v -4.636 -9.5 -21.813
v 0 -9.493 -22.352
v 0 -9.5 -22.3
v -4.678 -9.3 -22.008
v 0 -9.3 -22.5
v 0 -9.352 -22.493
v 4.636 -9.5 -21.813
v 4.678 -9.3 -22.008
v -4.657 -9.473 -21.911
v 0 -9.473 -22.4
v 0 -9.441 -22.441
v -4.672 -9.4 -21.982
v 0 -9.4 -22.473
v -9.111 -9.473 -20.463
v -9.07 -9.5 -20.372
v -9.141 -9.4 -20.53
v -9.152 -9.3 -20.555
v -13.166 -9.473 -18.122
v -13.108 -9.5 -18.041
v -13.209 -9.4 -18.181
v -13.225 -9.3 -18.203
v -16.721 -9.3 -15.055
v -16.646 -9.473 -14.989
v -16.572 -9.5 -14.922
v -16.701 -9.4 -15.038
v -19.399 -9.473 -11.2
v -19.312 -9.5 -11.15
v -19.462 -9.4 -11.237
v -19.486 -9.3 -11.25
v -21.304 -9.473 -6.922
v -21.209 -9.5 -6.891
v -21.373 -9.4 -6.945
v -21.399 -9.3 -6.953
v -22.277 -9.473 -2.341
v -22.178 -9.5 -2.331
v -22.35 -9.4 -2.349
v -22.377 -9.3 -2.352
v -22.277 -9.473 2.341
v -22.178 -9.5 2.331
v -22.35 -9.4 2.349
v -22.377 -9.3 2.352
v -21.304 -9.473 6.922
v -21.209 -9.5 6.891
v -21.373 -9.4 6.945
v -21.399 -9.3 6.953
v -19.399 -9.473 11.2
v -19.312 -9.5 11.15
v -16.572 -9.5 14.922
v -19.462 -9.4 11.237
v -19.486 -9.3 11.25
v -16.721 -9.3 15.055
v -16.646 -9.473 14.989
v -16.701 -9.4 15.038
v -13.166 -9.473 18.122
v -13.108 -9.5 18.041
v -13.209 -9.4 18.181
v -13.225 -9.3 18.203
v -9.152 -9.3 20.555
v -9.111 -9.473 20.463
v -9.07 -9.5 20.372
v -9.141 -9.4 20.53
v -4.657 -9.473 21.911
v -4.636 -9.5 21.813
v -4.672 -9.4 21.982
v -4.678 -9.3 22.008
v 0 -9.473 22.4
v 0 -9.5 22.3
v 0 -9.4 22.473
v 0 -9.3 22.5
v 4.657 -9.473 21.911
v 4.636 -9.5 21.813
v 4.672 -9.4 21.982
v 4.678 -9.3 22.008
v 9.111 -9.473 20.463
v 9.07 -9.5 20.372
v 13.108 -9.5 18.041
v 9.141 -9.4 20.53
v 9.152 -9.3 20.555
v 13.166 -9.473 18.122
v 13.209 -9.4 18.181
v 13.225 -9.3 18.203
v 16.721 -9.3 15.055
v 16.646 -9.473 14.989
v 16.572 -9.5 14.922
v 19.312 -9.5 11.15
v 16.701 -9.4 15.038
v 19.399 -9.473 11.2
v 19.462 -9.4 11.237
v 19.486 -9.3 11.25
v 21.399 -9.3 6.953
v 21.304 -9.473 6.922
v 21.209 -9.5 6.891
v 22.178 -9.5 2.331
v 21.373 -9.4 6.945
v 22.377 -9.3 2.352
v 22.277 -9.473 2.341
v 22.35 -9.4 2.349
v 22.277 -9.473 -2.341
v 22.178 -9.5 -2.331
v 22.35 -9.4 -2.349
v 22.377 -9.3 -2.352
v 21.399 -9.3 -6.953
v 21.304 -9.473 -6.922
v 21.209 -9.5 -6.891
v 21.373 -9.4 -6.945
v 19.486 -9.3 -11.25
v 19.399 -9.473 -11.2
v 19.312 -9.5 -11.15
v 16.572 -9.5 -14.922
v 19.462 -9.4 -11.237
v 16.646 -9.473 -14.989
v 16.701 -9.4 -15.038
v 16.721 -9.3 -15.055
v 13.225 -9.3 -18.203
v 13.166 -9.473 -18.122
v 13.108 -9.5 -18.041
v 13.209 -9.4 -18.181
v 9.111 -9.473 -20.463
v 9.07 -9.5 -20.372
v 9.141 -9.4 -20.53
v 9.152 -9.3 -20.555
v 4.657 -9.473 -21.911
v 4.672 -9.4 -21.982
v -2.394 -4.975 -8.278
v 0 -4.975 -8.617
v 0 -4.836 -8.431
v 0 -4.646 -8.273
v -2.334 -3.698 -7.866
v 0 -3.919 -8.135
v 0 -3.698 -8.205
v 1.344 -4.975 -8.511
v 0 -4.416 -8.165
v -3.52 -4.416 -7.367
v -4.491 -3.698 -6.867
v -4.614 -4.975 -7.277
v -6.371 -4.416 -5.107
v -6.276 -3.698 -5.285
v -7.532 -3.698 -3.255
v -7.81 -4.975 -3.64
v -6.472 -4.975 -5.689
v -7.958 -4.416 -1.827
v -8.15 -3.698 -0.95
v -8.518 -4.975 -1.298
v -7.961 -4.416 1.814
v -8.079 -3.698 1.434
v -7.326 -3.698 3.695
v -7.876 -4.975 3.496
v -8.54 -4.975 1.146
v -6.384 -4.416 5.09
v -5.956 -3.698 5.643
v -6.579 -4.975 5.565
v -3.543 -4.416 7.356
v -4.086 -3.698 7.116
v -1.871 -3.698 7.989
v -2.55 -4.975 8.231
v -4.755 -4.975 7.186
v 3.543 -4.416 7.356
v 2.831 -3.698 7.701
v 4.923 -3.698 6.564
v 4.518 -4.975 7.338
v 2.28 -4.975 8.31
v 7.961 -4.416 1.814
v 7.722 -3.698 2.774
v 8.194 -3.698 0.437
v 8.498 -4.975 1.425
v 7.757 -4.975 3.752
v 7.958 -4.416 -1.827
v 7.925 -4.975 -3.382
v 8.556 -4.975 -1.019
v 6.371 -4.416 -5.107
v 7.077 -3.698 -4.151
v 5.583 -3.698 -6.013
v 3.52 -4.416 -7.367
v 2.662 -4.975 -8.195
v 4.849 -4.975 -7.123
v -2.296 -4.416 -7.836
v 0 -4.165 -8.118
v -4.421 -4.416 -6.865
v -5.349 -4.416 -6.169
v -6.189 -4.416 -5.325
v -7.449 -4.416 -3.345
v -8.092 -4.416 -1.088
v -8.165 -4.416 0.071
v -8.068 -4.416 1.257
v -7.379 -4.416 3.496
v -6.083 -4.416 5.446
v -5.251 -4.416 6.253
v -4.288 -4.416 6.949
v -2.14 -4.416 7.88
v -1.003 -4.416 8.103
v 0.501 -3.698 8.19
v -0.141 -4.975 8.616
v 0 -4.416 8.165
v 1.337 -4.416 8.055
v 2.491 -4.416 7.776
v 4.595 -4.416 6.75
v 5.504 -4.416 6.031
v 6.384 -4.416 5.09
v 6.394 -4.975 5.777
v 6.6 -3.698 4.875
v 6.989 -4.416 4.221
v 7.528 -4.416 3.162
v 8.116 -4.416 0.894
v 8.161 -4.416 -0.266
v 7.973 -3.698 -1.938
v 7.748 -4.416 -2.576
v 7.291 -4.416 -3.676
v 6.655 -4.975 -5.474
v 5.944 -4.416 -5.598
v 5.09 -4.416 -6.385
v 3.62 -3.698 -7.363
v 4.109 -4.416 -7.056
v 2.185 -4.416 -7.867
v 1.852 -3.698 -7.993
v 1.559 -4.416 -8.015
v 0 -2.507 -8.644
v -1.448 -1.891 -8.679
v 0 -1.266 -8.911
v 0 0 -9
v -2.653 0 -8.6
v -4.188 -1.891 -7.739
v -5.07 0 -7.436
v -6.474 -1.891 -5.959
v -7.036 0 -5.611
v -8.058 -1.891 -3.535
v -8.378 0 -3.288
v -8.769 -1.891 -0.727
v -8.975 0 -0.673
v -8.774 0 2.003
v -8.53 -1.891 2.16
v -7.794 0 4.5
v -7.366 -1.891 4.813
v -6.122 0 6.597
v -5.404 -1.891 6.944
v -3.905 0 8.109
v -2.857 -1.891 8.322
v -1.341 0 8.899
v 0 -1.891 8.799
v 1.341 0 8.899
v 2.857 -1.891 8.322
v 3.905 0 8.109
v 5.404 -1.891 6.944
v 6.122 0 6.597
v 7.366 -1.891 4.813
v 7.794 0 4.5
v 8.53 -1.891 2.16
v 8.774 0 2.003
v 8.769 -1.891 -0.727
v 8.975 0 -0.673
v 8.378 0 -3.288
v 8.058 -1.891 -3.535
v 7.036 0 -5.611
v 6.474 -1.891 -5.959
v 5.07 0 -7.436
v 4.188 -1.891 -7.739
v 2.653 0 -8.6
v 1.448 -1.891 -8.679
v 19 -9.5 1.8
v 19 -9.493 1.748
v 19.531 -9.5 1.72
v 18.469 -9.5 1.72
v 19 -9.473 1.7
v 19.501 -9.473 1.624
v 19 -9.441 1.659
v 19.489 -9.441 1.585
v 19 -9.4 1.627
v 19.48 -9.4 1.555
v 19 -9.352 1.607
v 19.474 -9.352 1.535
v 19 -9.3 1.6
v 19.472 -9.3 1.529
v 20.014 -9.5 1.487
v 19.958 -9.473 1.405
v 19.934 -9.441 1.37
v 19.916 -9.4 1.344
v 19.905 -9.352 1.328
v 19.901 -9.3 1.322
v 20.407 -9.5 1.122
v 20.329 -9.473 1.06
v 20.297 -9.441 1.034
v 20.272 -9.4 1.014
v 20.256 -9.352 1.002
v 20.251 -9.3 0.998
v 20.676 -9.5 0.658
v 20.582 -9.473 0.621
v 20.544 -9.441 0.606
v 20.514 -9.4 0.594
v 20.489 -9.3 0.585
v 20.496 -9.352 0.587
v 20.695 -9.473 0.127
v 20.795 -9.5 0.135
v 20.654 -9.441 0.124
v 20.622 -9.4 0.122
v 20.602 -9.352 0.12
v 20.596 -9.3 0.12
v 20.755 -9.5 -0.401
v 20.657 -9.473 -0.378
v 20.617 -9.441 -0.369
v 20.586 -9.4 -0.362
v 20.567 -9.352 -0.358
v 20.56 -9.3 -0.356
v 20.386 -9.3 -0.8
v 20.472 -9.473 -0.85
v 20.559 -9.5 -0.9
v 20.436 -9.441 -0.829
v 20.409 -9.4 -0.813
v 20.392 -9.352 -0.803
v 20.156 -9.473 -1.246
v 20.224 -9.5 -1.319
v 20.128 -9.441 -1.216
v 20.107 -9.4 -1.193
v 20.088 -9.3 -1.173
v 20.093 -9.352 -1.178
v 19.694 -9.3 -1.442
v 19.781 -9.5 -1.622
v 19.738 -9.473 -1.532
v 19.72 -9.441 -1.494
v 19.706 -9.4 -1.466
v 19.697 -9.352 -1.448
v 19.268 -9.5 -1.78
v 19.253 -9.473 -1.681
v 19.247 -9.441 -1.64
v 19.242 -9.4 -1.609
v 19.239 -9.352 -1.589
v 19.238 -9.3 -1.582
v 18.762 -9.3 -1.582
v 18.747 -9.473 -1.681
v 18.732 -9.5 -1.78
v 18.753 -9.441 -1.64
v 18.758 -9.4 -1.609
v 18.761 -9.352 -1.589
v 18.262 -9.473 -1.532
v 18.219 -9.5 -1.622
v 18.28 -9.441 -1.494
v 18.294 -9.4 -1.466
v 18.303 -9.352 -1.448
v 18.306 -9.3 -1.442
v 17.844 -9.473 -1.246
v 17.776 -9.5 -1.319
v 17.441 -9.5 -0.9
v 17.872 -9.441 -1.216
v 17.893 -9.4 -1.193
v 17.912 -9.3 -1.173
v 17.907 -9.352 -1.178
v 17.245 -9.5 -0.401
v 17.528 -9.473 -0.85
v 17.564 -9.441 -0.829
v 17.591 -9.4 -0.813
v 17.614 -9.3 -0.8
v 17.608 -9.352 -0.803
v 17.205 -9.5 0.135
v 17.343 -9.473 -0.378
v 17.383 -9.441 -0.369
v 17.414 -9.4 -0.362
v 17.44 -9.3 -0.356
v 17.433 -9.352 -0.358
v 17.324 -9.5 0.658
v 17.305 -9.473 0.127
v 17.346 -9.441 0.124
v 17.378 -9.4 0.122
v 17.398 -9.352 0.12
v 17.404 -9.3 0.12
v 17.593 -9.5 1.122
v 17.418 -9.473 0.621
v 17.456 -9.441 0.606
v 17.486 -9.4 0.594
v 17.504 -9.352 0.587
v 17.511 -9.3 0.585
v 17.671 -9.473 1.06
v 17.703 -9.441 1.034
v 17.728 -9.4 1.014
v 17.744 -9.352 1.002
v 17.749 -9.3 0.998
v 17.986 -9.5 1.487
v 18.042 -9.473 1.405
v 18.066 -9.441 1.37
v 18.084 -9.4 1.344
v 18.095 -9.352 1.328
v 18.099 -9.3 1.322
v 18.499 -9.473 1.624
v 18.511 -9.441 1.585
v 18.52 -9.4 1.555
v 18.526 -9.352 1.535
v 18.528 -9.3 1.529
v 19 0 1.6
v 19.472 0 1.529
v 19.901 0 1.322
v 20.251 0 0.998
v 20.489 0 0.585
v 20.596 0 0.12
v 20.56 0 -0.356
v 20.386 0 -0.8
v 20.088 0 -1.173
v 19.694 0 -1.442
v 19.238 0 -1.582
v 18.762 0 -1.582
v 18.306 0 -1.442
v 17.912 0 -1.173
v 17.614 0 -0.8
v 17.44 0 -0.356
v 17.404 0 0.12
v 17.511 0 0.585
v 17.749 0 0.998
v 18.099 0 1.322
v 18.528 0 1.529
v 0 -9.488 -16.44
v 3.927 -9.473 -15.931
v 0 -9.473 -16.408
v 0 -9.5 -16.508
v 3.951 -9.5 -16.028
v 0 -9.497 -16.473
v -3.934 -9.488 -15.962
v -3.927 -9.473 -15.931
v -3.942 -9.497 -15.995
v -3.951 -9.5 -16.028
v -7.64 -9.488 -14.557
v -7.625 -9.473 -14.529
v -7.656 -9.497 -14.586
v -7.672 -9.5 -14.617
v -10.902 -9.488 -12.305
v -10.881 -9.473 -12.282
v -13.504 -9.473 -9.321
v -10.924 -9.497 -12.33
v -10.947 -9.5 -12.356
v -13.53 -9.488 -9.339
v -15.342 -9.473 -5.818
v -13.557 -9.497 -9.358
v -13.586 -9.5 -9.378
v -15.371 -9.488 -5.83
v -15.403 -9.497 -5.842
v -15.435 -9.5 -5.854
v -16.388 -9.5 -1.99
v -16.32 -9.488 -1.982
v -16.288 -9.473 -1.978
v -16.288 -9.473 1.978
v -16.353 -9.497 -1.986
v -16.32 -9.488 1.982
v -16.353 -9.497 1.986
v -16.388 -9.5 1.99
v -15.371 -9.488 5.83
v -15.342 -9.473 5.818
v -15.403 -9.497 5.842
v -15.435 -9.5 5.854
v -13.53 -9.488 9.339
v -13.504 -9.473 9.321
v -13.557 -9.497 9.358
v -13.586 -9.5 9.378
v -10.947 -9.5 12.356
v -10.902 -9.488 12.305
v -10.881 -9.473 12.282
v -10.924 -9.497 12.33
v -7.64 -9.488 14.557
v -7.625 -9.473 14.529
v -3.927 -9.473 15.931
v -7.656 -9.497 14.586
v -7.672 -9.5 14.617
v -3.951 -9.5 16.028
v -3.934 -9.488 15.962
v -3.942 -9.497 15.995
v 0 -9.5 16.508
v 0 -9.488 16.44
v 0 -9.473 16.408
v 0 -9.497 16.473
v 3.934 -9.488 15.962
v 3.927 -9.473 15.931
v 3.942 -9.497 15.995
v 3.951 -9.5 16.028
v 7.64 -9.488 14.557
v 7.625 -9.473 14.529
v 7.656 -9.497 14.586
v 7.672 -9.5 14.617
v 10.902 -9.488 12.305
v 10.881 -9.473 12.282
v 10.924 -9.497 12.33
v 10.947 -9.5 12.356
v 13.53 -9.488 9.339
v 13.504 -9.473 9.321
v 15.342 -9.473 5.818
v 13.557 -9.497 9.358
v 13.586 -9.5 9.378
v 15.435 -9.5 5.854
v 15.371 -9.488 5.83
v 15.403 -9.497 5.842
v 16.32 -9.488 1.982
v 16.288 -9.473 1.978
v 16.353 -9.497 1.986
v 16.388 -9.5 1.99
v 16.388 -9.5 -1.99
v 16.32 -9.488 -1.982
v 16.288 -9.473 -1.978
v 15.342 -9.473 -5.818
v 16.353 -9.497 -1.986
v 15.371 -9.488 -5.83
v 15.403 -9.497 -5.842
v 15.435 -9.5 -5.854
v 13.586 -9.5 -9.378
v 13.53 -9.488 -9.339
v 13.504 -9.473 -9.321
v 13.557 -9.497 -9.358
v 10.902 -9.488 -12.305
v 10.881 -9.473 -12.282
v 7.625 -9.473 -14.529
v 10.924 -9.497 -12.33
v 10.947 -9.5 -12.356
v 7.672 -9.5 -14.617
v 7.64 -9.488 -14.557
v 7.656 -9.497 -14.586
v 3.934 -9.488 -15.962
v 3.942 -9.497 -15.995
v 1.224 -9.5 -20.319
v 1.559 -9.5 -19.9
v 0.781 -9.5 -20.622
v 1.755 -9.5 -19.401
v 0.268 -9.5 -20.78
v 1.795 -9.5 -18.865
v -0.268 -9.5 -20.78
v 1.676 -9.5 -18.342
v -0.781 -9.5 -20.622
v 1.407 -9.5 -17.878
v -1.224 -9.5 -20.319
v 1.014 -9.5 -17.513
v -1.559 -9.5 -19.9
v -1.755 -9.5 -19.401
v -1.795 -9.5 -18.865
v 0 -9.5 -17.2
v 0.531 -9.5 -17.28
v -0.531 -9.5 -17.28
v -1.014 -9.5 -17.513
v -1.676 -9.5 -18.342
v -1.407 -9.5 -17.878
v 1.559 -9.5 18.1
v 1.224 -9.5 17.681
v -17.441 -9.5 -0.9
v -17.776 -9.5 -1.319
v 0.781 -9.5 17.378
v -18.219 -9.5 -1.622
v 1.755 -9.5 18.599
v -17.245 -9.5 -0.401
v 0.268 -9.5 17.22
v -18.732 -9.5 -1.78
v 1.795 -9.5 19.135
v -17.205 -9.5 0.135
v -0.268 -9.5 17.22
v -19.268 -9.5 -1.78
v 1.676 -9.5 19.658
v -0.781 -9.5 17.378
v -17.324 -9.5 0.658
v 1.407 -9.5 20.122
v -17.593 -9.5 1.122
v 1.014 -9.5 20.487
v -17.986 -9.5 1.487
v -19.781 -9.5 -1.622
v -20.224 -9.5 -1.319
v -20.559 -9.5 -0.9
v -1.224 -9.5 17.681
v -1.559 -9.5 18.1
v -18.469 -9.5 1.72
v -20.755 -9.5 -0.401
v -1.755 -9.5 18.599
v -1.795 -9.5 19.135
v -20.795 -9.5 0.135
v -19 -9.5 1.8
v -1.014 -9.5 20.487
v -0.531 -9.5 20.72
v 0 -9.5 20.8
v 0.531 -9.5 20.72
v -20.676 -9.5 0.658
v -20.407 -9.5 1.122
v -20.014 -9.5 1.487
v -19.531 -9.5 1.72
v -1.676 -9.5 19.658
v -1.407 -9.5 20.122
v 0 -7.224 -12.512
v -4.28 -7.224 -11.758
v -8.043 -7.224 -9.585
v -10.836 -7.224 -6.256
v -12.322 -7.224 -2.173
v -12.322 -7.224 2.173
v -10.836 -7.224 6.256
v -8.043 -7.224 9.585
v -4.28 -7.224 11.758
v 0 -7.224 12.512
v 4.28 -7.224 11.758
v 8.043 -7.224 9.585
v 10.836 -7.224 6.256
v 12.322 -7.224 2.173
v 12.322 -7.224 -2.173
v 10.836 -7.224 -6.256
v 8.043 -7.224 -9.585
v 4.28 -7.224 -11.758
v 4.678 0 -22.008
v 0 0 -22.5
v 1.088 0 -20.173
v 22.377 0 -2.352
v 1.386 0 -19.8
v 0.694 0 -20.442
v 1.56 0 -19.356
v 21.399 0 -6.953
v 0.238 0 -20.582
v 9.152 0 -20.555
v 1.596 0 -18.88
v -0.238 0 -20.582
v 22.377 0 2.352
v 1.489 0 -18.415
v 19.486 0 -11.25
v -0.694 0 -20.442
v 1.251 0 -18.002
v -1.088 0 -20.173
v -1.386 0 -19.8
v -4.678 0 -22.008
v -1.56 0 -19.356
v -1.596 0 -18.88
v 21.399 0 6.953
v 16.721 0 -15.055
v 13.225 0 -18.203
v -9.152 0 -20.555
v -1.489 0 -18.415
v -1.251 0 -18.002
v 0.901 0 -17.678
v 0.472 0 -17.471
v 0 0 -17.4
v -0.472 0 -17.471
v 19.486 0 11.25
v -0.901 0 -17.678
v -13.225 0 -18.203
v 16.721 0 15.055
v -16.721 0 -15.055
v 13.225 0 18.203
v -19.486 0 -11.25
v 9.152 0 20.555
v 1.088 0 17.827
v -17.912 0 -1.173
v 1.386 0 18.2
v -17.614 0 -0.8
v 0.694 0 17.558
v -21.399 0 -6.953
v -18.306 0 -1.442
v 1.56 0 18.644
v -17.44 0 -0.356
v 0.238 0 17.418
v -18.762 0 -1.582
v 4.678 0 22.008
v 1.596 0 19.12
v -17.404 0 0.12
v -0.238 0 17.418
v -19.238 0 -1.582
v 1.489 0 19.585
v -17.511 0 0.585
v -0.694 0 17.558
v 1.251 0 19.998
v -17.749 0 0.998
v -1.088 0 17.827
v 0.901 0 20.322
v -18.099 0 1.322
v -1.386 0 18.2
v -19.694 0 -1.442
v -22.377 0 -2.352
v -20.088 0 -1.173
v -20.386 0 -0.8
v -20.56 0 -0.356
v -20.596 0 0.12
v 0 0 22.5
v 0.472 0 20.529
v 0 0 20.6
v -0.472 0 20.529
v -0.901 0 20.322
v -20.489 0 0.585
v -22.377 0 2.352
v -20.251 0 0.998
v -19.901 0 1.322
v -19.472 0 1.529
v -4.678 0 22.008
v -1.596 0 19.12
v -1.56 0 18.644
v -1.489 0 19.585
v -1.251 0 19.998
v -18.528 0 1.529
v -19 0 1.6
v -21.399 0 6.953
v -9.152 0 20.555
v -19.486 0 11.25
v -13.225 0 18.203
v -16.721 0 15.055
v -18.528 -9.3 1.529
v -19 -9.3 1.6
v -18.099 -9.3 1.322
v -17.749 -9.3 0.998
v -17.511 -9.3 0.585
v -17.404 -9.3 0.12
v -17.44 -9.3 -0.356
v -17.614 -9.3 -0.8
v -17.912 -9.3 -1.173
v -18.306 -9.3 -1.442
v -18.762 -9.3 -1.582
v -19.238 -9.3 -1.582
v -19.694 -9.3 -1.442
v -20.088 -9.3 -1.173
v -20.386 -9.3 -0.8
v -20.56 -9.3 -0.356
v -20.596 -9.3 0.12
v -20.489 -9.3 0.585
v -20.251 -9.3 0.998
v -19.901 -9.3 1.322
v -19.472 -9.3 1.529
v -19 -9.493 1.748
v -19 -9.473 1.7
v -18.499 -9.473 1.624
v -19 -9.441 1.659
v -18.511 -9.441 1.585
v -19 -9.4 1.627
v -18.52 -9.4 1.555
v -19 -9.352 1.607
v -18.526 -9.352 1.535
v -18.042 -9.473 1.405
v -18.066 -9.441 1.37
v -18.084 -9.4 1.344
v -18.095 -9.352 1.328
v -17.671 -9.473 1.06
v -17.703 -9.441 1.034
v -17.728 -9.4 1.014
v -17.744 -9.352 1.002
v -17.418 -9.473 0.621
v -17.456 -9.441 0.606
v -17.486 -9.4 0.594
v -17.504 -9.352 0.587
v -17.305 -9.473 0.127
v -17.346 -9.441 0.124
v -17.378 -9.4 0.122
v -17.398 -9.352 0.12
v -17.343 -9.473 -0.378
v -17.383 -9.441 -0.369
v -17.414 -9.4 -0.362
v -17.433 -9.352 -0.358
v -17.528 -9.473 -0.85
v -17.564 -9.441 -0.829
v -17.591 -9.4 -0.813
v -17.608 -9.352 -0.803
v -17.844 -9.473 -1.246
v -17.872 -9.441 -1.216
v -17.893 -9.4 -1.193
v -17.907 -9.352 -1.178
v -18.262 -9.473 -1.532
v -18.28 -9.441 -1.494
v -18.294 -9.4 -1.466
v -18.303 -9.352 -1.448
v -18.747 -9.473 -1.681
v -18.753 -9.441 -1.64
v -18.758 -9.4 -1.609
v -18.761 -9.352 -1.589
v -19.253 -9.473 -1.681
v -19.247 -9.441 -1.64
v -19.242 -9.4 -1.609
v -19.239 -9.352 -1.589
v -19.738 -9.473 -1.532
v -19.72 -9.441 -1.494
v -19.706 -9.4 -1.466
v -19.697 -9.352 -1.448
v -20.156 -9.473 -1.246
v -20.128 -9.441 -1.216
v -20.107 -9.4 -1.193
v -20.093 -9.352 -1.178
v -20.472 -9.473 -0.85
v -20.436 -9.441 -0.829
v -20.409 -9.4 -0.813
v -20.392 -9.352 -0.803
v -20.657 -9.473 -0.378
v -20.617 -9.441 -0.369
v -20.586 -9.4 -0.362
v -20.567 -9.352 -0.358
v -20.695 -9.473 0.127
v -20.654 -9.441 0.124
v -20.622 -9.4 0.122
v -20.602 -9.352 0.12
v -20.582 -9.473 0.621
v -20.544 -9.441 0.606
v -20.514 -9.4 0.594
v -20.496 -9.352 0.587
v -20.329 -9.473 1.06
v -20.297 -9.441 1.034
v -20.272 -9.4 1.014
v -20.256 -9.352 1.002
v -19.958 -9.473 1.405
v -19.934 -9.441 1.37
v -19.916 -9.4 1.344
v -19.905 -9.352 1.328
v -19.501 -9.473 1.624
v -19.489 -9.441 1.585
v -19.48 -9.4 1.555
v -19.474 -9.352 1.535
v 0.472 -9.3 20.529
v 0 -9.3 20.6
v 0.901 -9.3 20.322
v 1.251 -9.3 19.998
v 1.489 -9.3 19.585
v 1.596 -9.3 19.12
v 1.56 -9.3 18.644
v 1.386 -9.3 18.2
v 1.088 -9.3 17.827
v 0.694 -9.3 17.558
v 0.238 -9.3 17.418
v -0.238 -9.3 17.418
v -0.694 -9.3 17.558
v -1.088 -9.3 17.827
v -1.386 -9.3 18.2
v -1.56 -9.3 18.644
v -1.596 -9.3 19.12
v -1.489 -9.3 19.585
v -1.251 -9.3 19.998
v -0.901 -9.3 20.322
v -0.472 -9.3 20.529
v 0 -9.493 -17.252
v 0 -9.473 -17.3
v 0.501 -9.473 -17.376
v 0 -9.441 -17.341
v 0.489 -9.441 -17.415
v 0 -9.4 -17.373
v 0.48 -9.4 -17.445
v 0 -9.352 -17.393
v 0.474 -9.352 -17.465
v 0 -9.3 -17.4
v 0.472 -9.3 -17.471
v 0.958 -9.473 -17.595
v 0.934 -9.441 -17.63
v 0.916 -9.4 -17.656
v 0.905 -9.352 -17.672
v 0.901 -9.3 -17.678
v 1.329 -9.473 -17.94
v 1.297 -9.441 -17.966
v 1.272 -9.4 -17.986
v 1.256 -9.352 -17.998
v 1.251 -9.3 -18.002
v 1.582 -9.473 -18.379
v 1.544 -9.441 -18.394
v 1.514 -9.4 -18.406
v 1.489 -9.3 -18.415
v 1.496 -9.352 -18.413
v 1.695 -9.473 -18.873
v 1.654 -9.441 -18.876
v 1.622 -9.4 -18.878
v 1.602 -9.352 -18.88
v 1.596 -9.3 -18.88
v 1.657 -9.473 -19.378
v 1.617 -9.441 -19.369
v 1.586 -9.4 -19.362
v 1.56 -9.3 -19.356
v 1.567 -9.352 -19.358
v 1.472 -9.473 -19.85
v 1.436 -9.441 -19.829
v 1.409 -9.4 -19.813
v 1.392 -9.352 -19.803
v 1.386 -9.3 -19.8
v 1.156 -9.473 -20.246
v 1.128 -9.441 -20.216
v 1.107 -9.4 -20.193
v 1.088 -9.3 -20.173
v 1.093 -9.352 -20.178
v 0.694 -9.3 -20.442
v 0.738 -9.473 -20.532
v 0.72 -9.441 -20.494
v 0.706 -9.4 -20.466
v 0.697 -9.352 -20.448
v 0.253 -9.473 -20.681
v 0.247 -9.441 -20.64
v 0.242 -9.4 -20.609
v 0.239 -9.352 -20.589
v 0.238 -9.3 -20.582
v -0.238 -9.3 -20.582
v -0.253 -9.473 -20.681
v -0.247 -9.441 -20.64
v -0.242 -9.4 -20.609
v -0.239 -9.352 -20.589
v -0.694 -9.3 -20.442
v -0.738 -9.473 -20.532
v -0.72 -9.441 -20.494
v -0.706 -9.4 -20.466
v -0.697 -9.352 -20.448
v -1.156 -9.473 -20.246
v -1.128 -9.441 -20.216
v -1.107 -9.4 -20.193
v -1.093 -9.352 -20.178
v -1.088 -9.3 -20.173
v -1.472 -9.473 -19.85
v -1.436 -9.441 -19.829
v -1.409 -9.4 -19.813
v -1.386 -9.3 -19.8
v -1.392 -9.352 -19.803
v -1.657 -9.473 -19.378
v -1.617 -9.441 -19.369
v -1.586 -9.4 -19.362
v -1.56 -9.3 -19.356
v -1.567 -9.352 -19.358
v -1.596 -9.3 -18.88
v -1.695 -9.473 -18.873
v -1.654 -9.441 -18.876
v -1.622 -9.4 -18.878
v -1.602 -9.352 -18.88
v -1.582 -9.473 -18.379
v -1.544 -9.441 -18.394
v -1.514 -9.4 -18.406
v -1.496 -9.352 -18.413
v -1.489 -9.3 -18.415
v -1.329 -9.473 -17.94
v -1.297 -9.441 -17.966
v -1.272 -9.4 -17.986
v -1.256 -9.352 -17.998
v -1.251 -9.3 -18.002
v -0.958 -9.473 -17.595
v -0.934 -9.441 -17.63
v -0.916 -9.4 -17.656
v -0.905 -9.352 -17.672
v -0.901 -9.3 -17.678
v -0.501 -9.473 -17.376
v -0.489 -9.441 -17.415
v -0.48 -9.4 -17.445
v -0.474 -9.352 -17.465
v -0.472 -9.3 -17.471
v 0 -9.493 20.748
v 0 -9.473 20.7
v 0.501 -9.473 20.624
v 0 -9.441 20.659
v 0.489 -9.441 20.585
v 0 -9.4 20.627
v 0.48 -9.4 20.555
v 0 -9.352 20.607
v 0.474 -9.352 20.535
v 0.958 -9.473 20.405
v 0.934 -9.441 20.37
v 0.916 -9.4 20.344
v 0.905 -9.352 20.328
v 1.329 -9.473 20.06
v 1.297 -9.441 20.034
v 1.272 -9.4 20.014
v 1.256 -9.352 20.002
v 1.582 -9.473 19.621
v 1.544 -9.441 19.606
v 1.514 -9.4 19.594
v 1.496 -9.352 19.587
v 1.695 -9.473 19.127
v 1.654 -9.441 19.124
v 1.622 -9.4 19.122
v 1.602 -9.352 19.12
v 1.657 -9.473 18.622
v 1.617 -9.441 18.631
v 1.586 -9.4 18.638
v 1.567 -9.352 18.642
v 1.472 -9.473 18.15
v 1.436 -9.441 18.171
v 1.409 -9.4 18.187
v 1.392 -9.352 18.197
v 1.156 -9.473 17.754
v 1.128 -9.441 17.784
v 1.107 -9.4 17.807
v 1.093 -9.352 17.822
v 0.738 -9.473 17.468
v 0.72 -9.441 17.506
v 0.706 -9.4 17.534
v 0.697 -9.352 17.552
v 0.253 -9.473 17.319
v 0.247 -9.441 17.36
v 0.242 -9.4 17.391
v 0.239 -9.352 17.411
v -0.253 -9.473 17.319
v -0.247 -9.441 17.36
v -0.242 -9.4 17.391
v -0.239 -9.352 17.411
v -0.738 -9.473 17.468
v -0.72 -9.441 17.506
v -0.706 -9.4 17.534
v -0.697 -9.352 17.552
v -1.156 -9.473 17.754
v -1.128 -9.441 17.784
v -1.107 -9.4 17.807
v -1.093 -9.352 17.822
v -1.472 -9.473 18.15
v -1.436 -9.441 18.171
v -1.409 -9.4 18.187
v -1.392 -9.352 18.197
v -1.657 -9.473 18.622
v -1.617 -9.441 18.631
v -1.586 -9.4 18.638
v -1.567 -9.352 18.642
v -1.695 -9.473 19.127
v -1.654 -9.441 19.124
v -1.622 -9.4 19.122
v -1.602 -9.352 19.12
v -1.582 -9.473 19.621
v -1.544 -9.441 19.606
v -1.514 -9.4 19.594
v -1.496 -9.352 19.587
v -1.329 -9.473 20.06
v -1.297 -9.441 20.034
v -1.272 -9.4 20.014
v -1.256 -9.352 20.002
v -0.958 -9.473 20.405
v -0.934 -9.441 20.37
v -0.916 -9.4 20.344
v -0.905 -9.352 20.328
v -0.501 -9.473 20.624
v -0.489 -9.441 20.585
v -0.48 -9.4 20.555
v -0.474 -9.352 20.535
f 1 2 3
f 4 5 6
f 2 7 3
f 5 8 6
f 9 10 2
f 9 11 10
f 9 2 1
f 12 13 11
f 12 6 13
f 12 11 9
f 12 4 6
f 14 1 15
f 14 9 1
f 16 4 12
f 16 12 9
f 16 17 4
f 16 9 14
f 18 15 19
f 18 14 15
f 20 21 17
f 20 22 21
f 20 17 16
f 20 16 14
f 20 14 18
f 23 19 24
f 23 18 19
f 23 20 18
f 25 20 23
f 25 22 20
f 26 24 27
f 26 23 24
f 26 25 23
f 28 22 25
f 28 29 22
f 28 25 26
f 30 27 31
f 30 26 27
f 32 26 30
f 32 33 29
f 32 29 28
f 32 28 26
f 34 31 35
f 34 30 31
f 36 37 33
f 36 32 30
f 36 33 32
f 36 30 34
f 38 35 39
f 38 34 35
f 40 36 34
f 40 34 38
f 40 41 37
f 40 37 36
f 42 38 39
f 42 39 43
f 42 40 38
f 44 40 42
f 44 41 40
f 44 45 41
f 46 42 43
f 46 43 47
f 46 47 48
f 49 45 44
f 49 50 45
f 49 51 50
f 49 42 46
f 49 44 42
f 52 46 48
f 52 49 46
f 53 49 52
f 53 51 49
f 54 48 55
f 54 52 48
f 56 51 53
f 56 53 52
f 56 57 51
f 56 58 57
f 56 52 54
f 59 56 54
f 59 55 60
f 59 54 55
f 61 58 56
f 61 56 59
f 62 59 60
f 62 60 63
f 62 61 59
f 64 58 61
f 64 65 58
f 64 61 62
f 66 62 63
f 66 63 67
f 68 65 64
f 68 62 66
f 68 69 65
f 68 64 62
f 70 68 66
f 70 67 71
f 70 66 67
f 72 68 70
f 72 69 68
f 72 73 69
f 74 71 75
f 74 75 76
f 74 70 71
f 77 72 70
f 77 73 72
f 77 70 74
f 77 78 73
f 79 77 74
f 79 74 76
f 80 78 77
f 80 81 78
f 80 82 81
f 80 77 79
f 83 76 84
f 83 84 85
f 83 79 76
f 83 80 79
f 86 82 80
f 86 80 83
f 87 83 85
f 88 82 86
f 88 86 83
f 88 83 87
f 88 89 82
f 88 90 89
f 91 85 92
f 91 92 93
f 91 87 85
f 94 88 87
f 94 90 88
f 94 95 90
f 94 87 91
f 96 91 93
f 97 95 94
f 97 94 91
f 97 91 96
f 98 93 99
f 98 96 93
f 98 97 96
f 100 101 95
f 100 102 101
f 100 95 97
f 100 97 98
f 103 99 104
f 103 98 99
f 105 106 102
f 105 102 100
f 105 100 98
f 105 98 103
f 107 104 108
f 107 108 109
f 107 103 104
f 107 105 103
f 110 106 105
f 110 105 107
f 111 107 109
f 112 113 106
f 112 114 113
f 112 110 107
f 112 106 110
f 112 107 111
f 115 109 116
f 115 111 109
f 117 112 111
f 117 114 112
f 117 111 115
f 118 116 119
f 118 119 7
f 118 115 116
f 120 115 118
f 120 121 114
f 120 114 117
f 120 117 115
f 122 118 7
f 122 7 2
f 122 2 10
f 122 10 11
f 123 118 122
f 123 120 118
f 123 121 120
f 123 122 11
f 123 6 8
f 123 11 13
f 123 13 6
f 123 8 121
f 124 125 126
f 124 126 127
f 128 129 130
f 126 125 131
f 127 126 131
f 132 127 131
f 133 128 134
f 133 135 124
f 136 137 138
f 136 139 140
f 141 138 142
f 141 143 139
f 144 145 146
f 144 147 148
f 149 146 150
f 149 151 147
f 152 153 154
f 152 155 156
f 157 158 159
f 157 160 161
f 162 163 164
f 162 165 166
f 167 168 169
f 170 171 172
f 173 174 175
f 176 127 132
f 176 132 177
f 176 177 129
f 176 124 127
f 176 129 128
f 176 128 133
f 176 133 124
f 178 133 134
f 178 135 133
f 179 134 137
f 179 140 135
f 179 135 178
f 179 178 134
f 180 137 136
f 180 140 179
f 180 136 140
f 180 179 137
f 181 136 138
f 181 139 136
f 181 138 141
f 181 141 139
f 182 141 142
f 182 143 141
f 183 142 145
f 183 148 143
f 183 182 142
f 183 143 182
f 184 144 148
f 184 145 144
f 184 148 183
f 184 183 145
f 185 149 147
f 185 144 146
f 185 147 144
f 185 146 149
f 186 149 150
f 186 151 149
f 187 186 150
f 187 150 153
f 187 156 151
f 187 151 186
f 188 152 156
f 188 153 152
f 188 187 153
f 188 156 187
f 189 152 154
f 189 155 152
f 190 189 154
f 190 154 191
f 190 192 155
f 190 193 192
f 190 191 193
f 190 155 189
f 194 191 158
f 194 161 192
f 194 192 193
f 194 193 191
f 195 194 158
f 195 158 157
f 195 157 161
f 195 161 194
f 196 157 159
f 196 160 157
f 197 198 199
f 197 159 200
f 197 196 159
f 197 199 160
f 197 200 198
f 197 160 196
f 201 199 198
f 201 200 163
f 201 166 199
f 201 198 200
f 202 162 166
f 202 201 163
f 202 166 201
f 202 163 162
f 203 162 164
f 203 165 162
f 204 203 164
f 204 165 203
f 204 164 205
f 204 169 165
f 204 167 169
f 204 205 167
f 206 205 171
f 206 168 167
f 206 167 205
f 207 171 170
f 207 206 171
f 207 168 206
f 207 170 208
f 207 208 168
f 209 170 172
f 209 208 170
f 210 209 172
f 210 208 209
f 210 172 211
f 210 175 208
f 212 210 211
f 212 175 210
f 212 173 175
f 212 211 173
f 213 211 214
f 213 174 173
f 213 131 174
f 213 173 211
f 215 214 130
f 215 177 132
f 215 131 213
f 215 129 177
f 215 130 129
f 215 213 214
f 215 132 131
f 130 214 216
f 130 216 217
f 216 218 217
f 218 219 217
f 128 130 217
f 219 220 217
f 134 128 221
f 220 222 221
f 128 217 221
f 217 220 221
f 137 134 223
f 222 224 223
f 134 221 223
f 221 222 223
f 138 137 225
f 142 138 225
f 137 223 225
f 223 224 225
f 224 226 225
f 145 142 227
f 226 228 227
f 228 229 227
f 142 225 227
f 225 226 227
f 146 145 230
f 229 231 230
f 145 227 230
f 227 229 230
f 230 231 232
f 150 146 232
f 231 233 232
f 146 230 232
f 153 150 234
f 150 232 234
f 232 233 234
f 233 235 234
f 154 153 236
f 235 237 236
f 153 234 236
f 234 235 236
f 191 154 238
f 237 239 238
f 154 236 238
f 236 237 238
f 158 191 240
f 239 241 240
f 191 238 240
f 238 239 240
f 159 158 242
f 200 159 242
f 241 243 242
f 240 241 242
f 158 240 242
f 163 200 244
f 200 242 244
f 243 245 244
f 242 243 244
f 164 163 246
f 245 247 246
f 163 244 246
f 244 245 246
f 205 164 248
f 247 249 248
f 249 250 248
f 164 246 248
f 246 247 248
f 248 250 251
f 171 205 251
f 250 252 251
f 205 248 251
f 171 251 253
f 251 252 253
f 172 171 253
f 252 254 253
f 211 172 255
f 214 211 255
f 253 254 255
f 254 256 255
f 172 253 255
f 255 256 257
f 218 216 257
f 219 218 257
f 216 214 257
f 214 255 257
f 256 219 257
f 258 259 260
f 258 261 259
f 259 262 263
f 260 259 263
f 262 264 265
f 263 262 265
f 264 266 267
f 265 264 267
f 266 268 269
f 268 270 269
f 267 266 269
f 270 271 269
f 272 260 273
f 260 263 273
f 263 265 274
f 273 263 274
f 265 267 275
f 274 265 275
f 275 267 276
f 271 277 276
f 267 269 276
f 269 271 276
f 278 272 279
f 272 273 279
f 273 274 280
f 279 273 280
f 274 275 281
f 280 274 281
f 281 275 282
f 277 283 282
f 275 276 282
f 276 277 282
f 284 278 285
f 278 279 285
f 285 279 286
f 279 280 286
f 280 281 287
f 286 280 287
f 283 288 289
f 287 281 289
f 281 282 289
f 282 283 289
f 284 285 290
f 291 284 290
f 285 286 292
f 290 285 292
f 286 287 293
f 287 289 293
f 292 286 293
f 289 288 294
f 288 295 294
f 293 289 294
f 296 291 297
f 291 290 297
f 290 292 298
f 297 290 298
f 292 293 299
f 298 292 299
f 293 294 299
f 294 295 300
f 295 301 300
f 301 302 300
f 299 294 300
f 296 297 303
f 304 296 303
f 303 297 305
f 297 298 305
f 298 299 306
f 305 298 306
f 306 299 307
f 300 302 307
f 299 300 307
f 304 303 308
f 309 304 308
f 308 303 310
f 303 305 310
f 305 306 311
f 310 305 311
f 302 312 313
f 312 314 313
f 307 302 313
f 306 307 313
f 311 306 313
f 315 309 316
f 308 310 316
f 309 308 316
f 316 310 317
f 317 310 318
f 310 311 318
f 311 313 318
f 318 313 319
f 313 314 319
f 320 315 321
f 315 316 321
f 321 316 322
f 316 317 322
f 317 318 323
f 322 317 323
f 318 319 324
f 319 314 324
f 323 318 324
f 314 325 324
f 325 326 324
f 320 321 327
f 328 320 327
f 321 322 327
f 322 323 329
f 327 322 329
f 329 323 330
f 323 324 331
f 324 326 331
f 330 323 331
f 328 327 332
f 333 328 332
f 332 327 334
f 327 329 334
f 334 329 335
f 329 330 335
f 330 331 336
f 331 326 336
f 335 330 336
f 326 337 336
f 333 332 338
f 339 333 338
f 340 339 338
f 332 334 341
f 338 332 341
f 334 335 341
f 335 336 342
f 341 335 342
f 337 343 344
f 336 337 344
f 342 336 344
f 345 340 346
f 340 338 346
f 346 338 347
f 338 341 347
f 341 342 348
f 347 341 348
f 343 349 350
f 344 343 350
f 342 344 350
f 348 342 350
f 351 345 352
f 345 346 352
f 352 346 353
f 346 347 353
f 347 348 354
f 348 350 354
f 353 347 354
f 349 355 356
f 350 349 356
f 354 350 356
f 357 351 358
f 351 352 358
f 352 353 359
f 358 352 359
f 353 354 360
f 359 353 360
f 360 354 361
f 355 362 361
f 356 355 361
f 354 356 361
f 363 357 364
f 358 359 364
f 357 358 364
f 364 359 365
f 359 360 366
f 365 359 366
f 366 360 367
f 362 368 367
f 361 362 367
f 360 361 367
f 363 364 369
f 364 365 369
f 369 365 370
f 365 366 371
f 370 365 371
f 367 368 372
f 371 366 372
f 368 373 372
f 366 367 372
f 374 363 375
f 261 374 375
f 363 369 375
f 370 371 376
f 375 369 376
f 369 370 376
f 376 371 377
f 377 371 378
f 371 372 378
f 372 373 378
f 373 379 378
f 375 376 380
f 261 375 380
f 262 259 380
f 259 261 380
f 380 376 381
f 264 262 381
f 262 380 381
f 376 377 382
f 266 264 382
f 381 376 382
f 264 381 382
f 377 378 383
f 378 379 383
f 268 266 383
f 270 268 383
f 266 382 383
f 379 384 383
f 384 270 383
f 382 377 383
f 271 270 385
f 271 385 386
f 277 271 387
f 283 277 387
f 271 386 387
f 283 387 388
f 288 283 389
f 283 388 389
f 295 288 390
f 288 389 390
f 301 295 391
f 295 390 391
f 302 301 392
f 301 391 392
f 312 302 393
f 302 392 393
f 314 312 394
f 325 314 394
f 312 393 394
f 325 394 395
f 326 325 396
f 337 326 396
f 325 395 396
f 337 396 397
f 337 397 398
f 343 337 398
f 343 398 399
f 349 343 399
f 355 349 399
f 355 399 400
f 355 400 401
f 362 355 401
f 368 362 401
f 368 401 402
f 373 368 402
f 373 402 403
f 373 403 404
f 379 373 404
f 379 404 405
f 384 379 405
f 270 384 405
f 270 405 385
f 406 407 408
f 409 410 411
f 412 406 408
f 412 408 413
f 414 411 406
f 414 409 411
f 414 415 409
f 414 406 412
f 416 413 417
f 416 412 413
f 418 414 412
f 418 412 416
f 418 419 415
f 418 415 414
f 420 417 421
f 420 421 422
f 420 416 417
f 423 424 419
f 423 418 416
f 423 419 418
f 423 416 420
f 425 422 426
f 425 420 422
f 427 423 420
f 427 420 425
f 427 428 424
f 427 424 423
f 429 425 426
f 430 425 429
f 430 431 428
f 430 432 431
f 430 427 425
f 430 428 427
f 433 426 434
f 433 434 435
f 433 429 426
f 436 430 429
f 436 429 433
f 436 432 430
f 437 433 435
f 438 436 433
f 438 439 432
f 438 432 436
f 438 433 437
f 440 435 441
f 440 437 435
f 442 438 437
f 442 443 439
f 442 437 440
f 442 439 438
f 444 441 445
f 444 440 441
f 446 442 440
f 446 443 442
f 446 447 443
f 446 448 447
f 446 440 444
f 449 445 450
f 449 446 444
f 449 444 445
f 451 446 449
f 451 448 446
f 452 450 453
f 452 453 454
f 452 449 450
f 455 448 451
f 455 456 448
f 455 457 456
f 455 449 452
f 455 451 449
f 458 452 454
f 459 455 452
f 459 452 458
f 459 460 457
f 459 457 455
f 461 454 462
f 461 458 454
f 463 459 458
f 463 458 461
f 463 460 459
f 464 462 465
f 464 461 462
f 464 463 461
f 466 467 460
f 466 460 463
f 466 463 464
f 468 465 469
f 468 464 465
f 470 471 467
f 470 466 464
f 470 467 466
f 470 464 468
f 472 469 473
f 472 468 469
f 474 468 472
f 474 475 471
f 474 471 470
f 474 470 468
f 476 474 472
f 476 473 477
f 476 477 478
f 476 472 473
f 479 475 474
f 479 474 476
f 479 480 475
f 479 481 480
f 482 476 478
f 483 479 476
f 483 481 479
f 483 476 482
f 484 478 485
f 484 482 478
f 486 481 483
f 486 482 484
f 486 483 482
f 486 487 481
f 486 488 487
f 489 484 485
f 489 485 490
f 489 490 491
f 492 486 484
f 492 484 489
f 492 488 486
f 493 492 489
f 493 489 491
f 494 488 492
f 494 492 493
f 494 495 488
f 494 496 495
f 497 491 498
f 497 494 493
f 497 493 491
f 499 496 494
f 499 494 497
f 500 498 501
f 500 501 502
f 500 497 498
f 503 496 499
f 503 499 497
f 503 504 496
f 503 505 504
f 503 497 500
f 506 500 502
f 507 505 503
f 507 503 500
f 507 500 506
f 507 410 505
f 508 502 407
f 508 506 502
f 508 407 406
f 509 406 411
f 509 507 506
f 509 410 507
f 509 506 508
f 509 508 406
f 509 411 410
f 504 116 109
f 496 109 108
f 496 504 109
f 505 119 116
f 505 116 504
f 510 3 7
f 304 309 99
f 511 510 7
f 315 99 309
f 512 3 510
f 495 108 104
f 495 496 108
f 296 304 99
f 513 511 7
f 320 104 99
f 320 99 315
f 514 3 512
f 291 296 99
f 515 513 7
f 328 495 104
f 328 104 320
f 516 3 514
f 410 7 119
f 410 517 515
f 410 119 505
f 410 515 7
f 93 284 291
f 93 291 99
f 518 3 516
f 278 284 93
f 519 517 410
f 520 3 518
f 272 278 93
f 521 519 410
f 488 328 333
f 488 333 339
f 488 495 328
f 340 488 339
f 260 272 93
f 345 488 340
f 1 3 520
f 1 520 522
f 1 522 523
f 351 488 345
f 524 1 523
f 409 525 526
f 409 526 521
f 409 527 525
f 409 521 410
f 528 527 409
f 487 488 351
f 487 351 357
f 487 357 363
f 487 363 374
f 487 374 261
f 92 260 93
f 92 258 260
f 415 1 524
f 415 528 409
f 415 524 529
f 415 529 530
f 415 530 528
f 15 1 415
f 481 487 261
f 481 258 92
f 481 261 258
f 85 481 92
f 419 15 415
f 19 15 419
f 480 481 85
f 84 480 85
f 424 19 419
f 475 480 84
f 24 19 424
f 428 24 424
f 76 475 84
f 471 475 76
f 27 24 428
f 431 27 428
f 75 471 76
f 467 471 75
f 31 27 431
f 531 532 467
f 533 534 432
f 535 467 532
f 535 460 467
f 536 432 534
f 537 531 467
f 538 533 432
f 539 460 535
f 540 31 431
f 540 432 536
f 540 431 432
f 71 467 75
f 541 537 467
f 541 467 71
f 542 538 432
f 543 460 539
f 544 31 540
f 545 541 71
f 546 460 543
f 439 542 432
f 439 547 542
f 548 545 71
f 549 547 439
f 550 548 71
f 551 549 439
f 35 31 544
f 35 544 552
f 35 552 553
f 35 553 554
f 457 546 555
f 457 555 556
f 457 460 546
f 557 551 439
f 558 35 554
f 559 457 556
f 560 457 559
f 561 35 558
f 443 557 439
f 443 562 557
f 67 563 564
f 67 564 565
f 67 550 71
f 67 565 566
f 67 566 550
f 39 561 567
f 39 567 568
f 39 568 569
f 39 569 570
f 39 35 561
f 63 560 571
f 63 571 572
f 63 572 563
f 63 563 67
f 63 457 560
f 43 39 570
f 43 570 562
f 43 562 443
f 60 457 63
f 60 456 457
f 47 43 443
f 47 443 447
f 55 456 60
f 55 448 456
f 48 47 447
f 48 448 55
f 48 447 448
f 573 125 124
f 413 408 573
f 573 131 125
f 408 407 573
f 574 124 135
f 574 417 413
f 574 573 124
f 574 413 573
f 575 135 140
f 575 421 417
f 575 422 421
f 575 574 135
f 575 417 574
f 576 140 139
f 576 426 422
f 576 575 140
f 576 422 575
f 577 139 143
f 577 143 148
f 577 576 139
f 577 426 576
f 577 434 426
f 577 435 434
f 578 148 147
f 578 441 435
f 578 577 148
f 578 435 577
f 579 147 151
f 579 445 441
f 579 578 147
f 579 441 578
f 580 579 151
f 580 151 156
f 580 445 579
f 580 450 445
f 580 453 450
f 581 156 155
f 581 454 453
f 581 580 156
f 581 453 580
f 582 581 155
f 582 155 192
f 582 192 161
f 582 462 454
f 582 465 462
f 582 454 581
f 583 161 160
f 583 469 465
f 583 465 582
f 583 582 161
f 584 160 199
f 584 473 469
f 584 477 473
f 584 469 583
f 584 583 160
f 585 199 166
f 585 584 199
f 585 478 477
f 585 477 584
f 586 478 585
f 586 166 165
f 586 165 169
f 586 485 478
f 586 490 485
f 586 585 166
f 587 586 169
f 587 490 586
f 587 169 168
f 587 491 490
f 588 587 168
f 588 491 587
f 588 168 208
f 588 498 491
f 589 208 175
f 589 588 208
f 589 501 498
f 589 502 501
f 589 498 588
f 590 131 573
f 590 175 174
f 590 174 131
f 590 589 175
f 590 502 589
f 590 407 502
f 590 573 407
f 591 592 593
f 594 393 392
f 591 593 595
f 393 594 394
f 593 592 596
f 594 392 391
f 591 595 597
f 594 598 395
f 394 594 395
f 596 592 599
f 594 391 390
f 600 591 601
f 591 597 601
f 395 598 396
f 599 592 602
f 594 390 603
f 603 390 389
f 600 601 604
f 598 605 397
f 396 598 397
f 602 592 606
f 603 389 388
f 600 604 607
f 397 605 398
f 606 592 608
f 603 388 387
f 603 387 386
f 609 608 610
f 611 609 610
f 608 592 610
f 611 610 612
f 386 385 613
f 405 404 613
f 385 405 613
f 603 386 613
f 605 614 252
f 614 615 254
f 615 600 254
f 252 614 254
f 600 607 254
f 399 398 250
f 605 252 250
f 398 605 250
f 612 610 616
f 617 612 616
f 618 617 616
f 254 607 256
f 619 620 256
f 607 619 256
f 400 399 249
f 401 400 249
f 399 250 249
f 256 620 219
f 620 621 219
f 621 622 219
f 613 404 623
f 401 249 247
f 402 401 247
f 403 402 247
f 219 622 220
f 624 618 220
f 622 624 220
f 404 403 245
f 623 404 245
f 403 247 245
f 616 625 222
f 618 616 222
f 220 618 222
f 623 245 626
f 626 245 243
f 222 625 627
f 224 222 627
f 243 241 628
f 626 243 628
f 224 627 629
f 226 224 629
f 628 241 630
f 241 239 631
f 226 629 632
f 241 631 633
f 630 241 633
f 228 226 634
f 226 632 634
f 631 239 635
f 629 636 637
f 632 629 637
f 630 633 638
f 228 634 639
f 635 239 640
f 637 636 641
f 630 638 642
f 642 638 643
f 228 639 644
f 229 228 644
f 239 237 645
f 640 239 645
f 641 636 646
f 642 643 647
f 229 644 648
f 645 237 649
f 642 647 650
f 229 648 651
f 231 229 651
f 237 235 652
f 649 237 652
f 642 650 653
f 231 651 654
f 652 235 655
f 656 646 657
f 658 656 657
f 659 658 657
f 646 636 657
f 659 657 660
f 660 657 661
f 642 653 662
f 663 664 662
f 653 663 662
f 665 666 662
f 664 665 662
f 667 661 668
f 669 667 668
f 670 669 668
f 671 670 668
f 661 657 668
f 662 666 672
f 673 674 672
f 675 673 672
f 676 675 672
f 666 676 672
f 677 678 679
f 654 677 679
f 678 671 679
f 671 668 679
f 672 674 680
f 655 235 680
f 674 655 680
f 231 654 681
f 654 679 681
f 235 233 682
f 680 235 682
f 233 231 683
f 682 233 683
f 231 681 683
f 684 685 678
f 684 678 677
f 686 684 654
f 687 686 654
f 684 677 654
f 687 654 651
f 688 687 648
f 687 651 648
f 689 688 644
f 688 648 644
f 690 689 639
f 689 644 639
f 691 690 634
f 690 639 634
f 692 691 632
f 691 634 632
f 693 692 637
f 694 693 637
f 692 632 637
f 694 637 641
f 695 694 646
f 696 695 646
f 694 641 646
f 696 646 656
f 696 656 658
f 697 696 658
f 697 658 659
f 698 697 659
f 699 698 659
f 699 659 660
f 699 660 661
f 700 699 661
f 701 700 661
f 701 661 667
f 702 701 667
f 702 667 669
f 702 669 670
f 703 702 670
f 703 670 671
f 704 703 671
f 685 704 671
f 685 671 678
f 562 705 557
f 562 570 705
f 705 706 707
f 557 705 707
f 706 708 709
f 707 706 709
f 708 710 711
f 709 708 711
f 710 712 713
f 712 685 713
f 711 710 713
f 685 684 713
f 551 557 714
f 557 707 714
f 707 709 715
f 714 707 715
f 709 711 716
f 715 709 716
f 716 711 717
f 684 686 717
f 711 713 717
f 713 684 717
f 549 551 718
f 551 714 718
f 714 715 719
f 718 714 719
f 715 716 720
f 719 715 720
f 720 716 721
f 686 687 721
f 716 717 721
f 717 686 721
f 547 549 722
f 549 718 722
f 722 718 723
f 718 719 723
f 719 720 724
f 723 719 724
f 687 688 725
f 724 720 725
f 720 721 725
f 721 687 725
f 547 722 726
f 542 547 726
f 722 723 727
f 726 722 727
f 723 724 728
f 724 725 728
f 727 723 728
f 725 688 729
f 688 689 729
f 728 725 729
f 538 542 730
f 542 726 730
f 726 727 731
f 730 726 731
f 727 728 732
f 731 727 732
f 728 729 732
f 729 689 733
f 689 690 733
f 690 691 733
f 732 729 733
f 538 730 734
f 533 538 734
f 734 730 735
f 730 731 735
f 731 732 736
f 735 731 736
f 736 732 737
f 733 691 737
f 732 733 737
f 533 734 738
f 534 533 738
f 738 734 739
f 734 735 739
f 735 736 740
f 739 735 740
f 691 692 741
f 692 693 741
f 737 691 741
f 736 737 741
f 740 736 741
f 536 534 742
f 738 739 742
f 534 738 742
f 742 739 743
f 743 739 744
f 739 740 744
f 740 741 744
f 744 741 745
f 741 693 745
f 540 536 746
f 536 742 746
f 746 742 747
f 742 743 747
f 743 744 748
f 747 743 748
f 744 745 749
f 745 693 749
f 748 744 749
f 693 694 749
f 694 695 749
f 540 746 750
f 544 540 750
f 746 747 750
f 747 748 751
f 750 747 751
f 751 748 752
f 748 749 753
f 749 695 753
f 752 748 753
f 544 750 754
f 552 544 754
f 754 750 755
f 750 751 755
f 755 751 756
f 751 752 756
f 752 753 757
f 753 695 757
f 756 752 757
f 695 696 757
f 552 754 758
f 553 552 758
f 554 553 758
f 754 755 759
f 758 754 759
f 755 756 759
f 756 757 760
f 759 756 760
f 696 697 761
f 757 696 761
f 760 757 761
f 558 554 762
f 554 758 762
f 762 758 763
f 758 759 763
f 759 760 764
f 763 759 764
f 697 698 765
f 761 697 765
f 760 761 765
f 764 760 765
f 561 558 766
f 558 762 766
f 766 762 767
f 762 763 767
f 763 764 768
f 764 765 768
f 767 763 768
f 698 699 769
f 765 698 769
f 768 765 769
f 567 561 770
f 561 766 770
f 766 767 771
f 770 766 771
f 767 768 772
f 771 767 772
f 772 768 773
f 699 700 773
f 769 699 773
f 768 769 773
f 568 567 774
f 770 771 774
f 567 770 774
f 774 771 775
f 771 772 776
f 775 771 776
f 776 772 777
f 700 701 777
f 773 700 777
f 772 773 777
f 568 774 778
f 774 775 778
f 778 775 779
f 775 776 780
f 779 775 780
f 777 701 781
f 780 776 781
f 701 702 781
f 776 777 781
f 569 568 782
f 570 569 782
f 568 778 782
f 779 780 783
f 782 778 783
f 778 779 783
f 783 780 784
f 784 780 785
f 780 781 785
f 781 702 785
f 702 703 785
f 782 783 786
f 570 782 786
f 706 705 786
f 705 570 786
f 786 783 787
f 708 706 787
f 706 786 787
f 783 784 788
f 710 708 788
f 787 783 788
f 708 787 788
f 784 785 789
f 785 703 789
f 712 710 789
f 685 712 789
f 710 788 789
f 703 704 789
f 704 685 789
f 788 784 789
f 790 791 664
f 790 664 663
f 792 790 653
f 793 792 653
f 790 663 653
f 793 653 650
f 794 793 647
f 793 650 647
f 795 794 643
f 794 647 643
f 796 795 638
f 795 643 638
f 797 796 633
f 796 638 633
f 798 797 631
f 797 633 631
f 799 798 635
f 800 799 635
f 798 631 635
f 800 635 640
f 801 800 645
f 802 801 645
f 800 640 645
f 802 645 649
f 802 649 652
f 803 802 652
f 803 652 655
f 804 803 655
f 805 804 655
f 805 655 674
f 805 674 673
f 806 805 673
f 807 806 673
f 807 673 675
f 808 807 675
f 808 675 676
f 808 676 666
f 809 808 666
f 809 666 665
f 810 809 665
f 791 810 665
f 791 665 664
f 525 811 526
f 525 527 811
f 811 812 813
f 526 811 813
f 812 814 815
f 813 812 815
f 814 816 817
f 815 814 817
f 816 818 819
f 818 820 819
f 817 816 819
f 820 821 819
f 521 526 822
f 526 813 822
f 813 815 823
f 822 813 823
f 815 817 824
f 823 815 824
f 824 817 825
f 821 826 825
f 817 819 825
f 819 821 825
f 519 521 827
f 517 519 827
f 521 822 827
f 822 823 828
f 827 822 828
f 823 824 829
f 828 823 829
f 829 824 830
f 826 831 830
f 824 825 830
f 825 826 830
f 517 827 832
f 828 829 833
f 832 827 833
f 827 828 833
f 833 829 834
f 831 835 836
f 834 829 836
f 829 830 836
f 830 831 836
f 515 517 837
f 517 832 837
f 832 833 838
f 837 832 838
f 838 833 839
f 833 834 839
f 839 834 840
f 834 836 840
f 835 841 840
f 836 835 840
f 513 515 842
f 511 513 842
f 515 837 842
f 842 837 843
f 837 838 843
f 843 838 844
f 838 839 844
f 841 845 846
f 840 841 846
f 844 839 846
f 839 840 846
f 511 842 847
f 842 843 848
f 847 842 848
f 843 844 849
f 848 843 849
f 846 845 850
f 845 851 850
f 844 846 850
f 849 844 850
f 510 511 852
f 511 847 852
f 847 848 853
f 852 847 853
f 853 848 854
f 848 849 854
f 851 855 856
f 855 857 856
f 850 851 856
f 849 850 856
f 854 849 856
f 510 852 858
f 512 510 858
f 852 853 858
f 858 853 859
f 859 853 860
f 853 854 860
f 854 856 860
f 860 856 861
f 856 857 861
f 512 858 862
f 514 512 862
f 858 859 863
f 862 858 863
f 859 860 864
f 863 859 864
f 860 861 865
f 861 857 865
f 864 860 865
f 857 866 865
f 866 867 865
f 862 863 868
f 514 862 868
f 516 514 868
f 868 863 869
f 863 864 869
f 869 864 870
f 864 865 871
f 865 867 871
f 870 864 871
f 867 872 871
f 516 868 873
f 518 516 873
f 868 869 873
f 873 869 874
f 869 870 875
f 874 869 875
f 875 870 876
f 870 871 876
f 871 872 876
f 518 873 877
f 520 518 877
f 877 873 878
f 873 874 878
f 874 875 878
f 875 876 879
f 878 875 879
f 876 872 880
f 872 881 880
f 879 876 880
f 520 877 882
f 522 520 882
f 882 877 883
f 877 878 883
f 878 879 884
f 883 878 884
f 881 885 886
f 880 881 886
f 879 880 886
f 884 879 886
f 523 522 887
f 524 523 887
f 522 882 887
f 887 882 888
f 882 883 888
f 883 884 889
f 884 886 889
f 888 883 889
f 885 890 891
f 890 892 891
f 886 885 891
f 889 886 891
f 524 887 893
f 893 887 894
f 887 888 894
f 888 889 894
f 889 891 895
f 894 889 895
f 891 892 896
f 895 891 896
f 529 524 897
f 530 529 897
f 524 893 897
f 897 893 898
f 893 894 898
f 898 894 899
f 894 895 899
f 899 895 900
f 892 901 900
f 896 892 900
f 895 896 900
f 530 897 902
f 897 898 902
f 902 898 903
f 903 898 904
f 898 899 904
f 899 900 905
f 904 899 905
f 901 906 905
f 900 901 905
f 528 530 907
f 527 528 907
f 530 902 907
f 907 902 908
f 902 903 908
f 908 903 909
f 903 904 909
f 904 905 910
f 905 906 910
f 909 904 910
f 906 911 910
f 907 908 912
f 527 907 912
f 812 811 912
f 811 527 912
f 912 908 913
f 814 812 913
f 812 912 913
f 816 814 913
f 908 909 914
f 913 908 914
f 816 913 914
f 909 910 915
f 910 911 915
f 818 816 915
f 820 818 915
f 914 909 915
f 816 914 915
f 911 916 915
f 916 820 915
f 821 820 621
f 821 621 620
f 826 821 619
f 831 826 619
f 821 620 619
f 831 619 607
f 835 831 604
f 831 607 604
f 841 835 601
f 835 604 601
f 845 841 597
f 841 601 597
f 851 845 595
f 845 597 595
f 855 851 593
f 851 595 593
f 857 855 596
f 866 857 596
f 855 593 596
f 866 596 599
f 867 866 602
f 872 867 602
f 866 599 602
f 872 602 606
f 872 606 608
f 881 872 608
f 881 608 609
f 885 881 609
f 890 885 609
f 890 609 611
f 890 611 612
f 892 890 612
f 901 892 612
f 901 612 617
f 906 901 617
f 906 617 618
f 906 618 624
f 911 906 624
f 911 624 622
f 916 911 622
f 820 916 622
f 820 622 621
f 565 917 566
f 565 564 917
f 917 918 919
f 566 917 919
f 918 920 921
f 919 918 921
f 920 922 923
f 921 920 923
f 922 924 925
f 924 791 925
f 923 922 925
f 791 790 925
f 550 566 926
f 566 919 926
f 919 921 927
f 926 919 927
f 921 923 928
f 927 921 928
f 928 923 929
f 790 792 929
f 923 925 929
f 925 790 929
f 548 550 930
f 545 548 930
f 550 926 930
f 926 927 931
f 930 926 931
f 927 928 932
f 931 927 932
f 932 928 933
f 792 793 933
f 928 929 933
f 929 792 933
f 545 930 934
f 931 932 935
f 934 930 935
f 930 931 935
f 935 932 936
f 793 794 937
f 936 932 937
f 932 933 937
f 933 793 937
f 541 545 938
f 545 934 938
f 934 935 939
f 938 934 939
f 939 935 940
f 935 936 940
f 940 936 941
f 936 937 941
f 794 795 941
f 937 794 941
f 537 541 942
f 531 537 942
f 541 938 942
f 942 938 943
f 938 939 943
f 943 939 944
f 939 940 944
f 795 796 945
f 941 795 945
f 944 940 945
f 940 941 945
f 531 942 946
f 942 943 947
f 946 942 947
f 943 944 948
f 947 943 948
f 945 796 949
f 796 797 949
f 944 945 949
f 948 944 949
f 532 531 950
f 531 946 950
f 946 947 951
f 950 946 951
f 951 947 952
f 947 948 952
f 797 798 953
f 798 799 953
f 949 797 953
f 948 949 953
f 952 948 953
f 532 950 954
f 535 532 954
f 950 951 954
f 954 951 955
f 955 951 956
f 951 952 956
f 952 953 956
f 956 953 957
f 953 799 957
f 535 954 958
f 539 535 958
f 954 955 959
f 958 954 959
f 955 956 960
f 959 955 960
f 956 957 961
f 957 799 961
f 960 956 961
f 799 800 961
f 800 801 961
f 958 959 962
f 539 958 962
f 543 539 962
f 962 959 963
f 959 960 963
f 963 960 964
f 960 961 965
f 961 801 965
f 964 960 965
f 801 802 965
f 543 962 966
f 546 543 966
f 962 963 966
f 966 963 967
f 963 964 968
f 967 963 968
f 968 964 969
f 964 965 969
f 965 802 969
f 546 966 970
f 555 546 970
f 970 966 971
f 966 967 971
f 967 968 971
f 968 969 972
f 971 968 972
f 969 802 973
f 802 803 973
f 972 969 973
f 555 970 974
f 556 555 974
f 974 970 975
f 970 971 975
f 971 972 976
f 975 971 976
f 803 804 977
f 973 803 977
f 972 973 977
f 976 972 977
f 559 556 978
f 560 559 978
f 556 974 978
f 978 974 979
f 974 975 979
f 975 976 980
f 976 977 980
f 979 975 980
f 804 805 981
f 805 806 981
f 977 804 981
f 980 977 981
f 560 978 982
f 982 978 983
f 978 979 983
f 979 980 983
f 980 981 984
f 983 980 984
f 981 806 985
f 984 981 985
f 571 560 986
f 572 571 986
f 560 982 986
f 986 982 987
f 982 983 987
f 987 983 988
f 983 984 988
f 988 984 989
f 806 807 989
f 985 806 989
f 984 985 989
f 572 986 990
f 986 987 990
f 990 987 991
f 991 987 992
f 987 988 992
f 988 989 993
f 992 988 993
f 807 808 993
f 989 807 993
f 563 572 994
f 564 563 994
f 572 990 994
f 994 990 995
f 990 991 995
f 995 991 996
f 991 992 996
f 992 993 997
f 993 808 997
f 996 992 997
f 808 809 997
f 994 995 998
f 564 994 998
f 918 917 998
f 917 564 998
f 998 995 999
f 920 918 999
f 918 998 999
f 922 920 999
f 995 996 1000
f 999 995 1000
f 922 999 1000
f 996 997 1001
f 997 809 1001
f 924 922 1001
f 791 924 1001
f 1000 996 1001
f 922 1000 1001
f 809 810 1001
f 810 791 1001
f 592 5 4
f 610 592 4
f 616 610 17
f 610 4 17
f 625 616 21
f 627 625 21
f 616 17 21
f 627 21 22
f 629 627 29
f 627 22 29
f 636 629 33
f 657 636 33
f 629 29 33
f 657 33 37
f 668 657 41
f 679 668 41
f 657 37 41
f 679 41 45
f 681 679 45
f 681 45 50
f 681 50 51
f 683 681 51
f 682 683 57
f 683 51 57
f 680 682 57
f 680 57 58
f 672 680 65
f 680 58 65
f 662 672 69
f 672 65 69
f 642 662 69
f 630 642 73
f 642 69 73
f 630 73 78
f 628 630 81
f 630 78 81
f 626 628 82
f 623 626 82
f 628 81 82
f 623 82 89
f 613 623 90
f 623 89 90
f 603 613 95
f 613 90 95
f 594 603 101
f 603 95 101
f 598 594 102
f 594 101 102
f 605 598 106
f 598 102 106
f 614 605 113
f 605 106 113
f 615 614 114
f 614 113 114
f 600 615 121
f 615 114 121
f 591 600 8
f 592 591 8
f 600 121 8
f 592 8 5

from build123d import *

# Parameters (mm, degrees)
SKETCH2_R          = 1.6
CUT_EXTRUDE1_DEPTH = 10
FILLET1_R          = 0.2
FILLET2_R          = 1


with BuildPart() as part:
    # Sketch1 → Revolve1 (revolve)
    with BuildSketch(Plane.XY):
        with BuildLine():
            ThreePointArc((-7.794228634, -4.5), (-8.693332437, -2.329371406), (-9, 0))
            Line((-9, 0), (-22.5, 0))
            Line((-22.5, 0), (-22.5, -9.5))
            Line((-22.5, -9.5), (-16.454482672, -9.5))
            Line((-16.454482672, -9.5), (-7.794228634, -4.5))
        make_face()
    revolve(axis=Axis((0, 0, 0), (0, 1, 0)))

    # Sketch2 → Cut-Extrude1 (cut)
    with BuildSketch(Plane(origin=(0, 0, 0), x_dir=(1, 0, 0), z_dir=(0, 1, 0))):
        with Locations((-19, 0)):
            Circle(SKETCH2_R)
        with Locations((0, 19)):
            Circle(SKETCH2_R)
        with Locations((19, 0)):
            Circle(SKETCH2_R)
        with Locations((0, -19)):
            Circle(SKETCH2_R)
    extrude(amount=-CUT_EXTRUDE1_DEPTH, mode=Mode.SUBTRACT)

    # Fillet1
    fillet1_edges = [part.edges().sort_by_distance(p)[0] for p in [
        (16.454482672, -9.5, 0),
        (22.5, -9.5, 0),
        (-20.6, -9.5, 0),
        (-1.6, -9.5, -19),
        (17.4, -9.5, 0),
        (-1.6, -9.5, 19),
    ]]
    fillet(fillet1_edges, radius=FILLET1_R)

    # Fillet2
    fillet2_edges = [part.edges().sort_by_distance(p)[0] for p in [
        (7.794228634, -4.5, 0),
    ]]
    fillet(fillet2_edges, radius=FILLET2_R)


solid = part.part
